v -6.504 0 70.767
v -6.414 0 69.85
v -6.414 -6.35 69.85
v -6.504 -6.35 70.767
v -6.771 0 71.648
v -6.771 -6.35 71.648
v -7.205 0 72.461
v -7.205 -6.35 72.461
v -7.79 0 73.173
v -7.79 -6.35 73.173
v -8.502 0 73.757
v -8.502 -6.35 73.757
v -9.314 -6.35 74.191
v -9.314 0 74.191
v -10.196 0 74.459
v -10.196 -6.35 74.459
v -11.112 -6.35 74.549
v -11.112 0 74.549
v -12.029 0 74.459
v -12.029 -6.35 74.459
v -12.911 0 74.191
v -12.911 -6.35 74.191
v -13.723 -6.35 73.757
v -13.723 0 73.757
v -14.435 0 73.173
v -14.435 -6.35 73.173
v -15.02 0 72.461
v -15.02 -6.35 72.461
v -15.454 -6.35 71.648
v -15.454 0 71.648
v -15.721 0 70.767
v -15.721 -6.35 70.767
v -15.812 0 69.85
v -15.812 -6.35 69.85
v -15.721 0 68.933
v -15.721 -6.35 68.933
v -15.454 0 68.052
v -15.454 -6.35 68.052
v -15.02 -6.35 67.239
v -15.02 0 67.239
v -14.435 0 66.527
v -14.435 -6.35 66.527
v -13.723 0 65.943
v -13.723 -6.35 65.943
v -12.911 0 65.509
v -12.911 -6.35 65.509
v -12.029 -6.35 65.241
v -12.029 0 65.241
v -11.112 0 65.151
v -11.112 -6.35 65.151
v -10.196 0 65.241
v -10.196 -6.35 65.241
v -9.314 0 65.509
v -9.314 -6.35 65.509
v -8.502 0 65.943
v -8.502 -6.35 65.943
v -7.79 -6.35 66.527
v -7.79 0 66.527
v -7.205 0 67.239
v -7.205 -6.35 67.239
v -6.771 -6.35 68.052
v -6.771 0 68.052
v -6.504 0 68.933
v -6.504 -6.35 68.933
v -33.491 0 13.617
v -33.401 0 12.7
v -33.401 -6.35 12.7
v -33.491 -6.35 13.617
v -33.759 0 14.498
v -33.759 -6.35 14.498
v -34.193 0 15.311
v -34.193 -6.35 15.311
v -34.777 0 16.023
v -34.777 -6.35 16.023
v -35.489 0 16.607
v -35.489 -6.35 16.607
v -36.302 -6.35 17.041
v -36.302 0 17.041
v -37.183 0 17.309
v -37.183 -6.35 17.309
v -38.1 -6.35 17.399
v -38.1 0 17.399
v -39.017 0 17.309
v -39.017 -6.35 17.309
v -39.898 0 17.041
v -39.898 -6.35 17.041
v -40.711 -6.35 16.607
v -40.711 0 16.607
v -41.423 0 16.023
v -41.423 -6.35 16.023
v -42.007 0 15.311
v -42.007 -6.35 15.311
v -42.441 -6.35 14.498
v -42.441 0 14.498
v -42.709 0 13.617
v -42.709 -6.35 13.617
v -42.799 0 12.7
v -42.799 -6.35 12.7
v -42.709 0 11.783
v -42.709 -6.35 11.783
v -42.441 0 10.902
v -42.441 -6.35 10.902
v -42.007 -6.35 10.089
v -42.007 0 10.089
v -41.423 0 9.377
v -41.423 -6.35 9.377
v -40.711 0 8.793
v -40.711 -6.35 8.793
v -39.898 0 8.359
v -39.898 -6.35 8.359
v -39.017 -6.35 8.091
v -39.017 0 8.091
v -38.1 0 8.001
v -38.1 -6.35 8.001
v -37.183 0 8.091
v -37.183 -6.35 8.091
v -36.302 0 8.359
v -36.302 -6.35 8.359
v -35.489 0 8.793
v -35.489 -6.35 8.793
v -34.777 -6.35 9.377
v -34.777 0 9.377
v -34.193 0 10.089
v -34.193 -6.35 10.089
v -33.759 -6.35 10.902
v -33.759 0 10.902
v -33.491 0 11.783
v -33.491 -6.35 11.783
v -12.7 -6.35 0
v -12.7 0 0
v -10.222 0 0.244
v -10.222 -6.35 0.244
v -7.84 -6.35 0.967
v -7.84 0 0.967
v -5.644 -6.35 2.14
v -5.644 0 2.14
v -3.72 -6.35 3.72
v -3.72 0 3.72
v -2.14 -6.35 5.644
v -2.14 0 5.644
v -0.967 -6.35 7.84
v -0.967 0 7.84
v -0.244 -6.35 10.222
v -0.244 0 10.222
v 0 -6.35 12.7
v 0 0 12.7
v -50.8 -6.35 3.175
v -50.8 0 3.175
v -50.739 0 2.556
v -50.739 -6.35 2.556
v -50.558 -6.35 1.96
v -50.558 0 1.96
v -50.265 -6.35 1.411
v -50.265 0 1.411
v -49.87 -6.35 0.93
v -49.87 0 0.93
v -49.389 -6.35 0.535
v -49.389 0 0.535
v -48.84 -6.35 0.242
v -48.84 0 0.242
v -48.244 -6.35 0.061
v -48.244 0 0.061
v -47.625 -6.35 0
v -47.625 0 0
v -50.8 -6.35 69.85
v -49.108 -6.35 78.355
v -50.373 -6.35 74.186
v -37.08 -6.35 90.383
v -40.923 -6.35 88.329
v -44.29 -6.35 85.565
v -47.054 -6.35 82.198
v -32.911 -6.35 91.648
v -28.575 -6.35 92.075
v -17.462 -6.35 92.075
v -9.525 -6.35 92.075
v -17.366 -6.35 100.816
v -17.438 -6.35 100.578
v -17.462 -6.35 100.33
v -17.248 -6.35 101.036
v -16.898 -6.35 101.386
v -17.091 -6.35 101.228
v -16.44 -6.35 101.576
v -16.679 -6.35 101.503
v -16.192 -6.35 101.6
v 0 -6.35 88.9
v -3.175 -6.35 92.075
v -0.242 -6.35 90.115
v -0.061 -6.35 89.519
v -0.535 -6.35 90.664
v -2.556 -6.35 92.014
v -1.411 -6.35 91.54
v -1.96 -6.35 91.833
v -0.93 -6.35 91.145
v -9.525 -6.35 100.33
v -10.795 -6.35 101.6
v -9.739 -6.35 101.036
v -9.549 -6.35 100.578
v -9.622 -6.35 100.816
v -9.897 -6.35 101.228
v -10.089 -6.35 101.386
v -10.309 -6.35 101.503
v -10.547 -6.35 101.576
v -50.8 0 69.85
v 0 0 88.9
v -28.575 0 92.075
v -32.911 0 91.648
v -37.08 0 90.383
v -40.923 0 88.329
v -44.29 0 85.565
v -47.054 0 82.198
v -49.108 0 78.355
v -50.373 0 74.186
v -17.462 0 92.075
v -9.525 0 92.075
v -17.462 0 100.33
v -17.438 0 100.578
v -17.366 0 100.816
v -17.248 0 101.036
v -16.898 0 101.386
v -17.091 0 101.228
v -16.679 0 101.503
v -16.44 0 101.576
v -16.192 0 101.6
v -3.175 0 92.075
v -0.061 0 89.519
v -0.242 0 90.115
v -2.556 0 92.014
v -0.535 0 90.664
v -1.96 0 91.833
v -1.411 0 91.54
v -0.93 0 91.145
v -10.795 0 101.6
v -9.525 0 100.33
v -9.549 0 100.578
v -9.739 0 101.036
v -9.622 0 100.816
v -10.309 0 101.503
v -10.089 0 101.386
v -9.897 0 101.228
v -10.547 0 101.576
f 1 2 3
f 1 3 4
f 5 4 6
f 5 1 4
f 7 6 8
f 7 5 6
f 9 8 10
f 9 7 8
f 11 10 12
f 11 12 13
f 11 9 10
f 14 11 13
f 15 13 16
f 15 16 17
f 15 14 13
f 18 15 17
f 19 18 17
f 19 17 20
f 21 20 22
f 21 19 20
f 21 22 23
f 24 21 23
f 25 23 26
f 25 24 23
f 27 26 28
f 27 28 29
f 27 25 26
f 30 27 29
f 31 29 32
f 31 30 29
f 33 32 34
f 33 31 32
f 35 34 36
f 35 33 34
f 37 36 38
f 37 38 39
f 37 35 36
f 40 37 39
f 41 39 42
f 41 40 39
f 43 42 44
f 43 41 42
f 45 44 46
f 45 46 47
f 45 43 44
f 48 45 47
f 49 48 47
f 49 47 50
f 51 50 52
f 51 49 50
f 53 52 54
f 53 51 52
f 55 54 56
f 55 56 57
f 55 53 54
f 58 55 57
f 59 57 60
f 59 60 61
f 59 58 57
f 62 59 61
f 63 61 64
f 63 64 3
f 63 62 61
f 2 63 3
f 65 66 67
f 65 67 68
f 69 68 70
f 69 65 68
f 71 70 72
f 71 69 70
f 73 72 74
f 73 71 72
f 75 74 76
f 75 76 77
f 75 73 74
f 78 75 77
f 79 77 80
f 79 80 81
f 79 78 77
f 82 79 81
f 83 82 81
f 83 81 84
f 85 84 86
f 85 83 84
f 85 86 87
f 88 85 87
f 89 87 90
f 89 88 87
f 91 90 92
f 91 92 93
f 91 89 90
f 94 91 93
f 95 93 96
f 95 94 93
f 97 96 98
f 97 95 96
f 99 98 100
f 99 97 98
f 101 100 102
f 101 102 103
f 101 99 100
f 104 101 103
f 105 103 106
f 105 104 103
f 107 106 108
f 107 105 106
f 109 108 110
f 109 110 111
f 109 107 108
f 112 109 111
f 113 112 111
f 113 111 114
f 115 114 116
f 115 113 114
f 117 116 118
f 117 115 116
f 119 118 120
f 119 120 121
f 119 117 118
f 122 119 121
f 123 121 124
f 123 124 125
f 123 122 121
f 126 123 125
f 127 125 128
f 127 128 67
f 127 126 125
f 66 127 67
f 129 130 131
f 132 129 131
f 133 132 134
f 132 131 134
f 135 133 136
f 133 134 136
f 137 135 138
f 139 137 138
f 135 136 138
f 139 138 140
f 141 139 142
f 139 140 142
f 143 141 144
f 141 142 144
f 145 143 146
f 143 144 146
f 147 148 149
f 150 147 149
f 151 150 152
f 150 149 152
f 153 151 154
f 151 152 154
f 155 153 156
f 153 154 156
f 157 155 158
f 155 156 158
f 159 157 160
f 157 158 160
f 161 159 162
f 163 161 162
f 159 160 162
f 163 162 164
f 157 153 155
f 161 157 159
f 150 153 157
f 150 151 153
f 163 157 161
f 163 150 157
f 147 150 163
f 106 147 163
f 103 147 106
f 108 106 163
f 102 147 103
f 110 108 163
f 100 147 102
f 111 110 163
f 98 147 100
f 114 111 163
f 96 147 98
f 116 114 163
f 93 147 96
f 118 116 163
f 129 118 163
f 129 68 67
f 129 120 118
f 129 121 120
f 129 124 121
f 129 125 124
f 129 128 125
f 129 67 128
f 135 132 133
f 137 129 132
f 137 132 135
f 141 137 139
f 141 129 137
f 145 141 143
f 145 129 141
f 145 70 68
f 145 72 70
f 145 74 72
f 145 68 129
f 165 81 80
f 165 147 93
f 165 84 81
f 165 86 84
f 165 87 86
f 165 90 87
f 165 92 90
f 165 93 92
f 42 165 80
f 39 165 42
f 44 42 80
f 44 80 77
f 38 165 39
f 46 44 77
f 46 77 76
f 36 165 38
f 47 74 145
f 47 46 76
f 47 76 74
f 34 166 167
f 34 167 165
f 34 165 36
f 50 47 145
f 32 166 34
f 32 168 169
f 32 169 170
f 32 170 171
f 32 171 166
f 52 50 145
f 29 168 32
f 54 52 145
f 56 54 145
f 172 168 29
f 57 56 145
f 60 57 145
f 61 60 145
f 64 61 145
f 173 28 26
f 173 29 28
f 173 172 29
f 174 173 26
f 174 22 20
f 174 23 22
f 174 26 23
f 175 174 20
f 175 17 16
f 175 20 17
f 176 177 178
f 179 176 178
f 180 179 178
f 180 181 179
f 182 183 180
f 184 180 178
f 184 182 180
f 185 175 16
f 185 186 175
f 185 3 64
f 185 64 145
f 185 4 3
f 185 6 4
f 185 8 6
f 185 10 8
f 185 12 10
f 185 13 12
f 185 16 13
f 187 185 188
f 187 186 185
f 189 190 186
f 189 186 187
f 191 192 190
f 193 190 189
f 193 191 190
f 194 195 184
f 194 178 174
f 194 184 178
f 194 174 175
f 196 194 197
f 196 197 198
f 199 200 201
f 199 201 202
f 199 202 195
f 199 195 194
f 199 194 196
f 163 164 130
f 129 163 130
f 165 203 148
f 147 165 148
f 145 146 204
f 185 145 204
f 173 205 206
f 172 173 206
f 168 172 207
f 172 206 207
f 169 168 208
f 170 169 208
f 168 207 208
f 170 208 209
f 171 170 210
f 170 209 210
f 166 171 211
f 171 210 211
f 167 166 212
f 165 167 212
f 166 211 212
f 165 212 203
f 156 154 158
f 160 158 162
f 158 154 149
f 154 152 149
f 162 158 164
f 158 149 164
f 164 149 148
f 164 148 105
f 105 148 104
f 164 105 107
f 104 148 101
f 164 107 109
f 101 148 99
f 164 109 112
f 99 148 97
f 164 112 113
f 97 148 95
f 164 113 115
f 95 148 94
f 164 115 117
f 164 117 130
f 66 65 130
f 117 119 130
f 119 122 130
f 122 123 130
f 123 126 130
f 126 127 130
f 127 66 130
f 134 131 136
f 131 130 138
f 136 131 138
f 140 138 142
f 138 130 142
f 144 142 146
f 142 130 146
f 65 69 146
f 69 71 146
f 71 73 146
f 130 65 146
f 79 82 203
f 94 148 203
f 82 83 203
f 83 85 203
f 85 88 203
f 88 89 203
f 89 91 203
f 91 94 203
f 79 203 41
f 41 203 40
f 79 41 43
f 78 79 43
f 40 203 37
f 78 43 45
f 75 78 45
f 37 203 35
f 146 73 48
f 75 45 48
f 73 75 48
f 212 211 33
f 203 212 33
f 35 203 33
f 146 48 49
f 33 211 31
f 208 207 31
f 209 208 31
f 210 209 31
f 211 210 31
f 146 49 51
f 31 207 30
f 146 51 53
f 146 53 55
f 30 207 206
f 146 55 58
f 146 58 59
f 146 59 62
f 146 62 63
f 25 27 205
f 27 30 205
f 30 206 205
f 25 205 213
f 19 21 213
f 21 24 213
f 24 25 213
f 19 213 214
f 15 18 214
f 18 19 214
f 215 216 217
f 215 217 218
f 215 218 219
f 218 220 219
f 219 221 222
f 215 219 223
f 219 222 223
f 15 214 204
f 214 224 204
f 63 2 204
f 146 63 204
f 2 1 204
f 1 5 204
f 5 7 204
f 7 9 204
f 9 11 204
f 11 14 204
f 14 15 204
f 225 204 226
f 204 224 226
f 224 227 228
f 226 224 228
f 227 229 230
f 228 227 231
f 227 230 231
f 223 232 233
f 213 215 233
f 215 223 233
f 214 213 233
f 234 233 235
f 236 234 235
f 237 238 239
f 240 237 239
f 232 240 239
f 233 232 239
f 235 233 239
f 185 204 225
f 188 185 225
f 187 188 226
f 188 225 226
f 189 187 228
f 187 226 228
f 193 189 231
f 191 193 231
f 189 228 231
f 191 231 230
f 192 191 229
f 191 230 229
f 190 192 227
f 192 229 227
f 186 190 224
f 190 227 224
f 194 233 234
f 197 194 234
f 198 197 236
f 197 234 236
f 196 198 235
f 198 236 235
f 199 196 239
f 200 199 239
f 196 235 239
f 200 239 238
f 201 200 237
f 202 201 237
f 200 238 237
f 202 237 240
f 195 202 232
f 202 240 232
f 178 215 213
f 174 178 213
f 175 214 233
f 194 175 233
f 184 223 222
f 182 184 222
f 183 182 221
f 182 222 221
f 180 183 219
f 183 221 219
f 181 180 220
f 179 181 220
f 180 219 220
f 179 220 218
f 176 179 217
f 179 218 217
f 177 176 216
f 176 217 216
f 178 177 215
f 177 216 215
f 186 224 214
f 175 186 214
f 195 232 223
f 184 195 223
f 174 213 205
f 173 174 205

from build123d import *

# Parameters (mm, degrees)
F0_R     = 4.699
F1_DEPTH = 6.35


with BuildPart() as f1:
    # F0 (on Front) → F1 (new body)
    with BuildSketch(Plane.XZ):
        with BuildLine():
            ThreePointArc((-12.7, 0), (-3.719744, 3.719744), (0, 12.7))
            Line((0, 12.7), (0, 88.9))
            ThreePointArc((0, 88.9), (-0.929936, 91.145064), (-3.175, 92.075))
            Line((-3.175, 92.075), (-9.525, 92.075))
            Line((-9.525, 92.075), (-9.525, 100.33))
            ThreePointArc((-9.525, 100.33), (-9.896974, 101.228026), (-10.795, 101.6))
            Line((-10.795, 101.6), (-16.1925, 101.6))
            ThreePointArc((-16.1925, 101.6), (-17.090526, 101.228026), (-17.4625, 100.33))
            Line((-17.4625, 100.33), (-17.4625, 92.075))
            Line((-17.4625, 92.075), (-28.575, 92.075))
            ThreePointArc((-28.575, 92.075), (-44.290448, 85.565448), (-50.8, 69.85))
            Line((-50.8, 69.85), (-50.8, 3.175))
            ThreePointArc((-50.8, 3.175), (-49.870064, 0.929936), (-47.625, 0))
            Line((-47.625, 0), (-12.7, 0))
        make_face()
        with Locations((-38.1, 12.7)):
            Circle(F0_R, mode=Mode.SUBTRACT)
        with Locations((-11.1125, 69.85)):
            Circle(F0_R, mode=Mode.SUBTRACT)
    extrude(amount=F1_DEPTH)


solid = f1.part
